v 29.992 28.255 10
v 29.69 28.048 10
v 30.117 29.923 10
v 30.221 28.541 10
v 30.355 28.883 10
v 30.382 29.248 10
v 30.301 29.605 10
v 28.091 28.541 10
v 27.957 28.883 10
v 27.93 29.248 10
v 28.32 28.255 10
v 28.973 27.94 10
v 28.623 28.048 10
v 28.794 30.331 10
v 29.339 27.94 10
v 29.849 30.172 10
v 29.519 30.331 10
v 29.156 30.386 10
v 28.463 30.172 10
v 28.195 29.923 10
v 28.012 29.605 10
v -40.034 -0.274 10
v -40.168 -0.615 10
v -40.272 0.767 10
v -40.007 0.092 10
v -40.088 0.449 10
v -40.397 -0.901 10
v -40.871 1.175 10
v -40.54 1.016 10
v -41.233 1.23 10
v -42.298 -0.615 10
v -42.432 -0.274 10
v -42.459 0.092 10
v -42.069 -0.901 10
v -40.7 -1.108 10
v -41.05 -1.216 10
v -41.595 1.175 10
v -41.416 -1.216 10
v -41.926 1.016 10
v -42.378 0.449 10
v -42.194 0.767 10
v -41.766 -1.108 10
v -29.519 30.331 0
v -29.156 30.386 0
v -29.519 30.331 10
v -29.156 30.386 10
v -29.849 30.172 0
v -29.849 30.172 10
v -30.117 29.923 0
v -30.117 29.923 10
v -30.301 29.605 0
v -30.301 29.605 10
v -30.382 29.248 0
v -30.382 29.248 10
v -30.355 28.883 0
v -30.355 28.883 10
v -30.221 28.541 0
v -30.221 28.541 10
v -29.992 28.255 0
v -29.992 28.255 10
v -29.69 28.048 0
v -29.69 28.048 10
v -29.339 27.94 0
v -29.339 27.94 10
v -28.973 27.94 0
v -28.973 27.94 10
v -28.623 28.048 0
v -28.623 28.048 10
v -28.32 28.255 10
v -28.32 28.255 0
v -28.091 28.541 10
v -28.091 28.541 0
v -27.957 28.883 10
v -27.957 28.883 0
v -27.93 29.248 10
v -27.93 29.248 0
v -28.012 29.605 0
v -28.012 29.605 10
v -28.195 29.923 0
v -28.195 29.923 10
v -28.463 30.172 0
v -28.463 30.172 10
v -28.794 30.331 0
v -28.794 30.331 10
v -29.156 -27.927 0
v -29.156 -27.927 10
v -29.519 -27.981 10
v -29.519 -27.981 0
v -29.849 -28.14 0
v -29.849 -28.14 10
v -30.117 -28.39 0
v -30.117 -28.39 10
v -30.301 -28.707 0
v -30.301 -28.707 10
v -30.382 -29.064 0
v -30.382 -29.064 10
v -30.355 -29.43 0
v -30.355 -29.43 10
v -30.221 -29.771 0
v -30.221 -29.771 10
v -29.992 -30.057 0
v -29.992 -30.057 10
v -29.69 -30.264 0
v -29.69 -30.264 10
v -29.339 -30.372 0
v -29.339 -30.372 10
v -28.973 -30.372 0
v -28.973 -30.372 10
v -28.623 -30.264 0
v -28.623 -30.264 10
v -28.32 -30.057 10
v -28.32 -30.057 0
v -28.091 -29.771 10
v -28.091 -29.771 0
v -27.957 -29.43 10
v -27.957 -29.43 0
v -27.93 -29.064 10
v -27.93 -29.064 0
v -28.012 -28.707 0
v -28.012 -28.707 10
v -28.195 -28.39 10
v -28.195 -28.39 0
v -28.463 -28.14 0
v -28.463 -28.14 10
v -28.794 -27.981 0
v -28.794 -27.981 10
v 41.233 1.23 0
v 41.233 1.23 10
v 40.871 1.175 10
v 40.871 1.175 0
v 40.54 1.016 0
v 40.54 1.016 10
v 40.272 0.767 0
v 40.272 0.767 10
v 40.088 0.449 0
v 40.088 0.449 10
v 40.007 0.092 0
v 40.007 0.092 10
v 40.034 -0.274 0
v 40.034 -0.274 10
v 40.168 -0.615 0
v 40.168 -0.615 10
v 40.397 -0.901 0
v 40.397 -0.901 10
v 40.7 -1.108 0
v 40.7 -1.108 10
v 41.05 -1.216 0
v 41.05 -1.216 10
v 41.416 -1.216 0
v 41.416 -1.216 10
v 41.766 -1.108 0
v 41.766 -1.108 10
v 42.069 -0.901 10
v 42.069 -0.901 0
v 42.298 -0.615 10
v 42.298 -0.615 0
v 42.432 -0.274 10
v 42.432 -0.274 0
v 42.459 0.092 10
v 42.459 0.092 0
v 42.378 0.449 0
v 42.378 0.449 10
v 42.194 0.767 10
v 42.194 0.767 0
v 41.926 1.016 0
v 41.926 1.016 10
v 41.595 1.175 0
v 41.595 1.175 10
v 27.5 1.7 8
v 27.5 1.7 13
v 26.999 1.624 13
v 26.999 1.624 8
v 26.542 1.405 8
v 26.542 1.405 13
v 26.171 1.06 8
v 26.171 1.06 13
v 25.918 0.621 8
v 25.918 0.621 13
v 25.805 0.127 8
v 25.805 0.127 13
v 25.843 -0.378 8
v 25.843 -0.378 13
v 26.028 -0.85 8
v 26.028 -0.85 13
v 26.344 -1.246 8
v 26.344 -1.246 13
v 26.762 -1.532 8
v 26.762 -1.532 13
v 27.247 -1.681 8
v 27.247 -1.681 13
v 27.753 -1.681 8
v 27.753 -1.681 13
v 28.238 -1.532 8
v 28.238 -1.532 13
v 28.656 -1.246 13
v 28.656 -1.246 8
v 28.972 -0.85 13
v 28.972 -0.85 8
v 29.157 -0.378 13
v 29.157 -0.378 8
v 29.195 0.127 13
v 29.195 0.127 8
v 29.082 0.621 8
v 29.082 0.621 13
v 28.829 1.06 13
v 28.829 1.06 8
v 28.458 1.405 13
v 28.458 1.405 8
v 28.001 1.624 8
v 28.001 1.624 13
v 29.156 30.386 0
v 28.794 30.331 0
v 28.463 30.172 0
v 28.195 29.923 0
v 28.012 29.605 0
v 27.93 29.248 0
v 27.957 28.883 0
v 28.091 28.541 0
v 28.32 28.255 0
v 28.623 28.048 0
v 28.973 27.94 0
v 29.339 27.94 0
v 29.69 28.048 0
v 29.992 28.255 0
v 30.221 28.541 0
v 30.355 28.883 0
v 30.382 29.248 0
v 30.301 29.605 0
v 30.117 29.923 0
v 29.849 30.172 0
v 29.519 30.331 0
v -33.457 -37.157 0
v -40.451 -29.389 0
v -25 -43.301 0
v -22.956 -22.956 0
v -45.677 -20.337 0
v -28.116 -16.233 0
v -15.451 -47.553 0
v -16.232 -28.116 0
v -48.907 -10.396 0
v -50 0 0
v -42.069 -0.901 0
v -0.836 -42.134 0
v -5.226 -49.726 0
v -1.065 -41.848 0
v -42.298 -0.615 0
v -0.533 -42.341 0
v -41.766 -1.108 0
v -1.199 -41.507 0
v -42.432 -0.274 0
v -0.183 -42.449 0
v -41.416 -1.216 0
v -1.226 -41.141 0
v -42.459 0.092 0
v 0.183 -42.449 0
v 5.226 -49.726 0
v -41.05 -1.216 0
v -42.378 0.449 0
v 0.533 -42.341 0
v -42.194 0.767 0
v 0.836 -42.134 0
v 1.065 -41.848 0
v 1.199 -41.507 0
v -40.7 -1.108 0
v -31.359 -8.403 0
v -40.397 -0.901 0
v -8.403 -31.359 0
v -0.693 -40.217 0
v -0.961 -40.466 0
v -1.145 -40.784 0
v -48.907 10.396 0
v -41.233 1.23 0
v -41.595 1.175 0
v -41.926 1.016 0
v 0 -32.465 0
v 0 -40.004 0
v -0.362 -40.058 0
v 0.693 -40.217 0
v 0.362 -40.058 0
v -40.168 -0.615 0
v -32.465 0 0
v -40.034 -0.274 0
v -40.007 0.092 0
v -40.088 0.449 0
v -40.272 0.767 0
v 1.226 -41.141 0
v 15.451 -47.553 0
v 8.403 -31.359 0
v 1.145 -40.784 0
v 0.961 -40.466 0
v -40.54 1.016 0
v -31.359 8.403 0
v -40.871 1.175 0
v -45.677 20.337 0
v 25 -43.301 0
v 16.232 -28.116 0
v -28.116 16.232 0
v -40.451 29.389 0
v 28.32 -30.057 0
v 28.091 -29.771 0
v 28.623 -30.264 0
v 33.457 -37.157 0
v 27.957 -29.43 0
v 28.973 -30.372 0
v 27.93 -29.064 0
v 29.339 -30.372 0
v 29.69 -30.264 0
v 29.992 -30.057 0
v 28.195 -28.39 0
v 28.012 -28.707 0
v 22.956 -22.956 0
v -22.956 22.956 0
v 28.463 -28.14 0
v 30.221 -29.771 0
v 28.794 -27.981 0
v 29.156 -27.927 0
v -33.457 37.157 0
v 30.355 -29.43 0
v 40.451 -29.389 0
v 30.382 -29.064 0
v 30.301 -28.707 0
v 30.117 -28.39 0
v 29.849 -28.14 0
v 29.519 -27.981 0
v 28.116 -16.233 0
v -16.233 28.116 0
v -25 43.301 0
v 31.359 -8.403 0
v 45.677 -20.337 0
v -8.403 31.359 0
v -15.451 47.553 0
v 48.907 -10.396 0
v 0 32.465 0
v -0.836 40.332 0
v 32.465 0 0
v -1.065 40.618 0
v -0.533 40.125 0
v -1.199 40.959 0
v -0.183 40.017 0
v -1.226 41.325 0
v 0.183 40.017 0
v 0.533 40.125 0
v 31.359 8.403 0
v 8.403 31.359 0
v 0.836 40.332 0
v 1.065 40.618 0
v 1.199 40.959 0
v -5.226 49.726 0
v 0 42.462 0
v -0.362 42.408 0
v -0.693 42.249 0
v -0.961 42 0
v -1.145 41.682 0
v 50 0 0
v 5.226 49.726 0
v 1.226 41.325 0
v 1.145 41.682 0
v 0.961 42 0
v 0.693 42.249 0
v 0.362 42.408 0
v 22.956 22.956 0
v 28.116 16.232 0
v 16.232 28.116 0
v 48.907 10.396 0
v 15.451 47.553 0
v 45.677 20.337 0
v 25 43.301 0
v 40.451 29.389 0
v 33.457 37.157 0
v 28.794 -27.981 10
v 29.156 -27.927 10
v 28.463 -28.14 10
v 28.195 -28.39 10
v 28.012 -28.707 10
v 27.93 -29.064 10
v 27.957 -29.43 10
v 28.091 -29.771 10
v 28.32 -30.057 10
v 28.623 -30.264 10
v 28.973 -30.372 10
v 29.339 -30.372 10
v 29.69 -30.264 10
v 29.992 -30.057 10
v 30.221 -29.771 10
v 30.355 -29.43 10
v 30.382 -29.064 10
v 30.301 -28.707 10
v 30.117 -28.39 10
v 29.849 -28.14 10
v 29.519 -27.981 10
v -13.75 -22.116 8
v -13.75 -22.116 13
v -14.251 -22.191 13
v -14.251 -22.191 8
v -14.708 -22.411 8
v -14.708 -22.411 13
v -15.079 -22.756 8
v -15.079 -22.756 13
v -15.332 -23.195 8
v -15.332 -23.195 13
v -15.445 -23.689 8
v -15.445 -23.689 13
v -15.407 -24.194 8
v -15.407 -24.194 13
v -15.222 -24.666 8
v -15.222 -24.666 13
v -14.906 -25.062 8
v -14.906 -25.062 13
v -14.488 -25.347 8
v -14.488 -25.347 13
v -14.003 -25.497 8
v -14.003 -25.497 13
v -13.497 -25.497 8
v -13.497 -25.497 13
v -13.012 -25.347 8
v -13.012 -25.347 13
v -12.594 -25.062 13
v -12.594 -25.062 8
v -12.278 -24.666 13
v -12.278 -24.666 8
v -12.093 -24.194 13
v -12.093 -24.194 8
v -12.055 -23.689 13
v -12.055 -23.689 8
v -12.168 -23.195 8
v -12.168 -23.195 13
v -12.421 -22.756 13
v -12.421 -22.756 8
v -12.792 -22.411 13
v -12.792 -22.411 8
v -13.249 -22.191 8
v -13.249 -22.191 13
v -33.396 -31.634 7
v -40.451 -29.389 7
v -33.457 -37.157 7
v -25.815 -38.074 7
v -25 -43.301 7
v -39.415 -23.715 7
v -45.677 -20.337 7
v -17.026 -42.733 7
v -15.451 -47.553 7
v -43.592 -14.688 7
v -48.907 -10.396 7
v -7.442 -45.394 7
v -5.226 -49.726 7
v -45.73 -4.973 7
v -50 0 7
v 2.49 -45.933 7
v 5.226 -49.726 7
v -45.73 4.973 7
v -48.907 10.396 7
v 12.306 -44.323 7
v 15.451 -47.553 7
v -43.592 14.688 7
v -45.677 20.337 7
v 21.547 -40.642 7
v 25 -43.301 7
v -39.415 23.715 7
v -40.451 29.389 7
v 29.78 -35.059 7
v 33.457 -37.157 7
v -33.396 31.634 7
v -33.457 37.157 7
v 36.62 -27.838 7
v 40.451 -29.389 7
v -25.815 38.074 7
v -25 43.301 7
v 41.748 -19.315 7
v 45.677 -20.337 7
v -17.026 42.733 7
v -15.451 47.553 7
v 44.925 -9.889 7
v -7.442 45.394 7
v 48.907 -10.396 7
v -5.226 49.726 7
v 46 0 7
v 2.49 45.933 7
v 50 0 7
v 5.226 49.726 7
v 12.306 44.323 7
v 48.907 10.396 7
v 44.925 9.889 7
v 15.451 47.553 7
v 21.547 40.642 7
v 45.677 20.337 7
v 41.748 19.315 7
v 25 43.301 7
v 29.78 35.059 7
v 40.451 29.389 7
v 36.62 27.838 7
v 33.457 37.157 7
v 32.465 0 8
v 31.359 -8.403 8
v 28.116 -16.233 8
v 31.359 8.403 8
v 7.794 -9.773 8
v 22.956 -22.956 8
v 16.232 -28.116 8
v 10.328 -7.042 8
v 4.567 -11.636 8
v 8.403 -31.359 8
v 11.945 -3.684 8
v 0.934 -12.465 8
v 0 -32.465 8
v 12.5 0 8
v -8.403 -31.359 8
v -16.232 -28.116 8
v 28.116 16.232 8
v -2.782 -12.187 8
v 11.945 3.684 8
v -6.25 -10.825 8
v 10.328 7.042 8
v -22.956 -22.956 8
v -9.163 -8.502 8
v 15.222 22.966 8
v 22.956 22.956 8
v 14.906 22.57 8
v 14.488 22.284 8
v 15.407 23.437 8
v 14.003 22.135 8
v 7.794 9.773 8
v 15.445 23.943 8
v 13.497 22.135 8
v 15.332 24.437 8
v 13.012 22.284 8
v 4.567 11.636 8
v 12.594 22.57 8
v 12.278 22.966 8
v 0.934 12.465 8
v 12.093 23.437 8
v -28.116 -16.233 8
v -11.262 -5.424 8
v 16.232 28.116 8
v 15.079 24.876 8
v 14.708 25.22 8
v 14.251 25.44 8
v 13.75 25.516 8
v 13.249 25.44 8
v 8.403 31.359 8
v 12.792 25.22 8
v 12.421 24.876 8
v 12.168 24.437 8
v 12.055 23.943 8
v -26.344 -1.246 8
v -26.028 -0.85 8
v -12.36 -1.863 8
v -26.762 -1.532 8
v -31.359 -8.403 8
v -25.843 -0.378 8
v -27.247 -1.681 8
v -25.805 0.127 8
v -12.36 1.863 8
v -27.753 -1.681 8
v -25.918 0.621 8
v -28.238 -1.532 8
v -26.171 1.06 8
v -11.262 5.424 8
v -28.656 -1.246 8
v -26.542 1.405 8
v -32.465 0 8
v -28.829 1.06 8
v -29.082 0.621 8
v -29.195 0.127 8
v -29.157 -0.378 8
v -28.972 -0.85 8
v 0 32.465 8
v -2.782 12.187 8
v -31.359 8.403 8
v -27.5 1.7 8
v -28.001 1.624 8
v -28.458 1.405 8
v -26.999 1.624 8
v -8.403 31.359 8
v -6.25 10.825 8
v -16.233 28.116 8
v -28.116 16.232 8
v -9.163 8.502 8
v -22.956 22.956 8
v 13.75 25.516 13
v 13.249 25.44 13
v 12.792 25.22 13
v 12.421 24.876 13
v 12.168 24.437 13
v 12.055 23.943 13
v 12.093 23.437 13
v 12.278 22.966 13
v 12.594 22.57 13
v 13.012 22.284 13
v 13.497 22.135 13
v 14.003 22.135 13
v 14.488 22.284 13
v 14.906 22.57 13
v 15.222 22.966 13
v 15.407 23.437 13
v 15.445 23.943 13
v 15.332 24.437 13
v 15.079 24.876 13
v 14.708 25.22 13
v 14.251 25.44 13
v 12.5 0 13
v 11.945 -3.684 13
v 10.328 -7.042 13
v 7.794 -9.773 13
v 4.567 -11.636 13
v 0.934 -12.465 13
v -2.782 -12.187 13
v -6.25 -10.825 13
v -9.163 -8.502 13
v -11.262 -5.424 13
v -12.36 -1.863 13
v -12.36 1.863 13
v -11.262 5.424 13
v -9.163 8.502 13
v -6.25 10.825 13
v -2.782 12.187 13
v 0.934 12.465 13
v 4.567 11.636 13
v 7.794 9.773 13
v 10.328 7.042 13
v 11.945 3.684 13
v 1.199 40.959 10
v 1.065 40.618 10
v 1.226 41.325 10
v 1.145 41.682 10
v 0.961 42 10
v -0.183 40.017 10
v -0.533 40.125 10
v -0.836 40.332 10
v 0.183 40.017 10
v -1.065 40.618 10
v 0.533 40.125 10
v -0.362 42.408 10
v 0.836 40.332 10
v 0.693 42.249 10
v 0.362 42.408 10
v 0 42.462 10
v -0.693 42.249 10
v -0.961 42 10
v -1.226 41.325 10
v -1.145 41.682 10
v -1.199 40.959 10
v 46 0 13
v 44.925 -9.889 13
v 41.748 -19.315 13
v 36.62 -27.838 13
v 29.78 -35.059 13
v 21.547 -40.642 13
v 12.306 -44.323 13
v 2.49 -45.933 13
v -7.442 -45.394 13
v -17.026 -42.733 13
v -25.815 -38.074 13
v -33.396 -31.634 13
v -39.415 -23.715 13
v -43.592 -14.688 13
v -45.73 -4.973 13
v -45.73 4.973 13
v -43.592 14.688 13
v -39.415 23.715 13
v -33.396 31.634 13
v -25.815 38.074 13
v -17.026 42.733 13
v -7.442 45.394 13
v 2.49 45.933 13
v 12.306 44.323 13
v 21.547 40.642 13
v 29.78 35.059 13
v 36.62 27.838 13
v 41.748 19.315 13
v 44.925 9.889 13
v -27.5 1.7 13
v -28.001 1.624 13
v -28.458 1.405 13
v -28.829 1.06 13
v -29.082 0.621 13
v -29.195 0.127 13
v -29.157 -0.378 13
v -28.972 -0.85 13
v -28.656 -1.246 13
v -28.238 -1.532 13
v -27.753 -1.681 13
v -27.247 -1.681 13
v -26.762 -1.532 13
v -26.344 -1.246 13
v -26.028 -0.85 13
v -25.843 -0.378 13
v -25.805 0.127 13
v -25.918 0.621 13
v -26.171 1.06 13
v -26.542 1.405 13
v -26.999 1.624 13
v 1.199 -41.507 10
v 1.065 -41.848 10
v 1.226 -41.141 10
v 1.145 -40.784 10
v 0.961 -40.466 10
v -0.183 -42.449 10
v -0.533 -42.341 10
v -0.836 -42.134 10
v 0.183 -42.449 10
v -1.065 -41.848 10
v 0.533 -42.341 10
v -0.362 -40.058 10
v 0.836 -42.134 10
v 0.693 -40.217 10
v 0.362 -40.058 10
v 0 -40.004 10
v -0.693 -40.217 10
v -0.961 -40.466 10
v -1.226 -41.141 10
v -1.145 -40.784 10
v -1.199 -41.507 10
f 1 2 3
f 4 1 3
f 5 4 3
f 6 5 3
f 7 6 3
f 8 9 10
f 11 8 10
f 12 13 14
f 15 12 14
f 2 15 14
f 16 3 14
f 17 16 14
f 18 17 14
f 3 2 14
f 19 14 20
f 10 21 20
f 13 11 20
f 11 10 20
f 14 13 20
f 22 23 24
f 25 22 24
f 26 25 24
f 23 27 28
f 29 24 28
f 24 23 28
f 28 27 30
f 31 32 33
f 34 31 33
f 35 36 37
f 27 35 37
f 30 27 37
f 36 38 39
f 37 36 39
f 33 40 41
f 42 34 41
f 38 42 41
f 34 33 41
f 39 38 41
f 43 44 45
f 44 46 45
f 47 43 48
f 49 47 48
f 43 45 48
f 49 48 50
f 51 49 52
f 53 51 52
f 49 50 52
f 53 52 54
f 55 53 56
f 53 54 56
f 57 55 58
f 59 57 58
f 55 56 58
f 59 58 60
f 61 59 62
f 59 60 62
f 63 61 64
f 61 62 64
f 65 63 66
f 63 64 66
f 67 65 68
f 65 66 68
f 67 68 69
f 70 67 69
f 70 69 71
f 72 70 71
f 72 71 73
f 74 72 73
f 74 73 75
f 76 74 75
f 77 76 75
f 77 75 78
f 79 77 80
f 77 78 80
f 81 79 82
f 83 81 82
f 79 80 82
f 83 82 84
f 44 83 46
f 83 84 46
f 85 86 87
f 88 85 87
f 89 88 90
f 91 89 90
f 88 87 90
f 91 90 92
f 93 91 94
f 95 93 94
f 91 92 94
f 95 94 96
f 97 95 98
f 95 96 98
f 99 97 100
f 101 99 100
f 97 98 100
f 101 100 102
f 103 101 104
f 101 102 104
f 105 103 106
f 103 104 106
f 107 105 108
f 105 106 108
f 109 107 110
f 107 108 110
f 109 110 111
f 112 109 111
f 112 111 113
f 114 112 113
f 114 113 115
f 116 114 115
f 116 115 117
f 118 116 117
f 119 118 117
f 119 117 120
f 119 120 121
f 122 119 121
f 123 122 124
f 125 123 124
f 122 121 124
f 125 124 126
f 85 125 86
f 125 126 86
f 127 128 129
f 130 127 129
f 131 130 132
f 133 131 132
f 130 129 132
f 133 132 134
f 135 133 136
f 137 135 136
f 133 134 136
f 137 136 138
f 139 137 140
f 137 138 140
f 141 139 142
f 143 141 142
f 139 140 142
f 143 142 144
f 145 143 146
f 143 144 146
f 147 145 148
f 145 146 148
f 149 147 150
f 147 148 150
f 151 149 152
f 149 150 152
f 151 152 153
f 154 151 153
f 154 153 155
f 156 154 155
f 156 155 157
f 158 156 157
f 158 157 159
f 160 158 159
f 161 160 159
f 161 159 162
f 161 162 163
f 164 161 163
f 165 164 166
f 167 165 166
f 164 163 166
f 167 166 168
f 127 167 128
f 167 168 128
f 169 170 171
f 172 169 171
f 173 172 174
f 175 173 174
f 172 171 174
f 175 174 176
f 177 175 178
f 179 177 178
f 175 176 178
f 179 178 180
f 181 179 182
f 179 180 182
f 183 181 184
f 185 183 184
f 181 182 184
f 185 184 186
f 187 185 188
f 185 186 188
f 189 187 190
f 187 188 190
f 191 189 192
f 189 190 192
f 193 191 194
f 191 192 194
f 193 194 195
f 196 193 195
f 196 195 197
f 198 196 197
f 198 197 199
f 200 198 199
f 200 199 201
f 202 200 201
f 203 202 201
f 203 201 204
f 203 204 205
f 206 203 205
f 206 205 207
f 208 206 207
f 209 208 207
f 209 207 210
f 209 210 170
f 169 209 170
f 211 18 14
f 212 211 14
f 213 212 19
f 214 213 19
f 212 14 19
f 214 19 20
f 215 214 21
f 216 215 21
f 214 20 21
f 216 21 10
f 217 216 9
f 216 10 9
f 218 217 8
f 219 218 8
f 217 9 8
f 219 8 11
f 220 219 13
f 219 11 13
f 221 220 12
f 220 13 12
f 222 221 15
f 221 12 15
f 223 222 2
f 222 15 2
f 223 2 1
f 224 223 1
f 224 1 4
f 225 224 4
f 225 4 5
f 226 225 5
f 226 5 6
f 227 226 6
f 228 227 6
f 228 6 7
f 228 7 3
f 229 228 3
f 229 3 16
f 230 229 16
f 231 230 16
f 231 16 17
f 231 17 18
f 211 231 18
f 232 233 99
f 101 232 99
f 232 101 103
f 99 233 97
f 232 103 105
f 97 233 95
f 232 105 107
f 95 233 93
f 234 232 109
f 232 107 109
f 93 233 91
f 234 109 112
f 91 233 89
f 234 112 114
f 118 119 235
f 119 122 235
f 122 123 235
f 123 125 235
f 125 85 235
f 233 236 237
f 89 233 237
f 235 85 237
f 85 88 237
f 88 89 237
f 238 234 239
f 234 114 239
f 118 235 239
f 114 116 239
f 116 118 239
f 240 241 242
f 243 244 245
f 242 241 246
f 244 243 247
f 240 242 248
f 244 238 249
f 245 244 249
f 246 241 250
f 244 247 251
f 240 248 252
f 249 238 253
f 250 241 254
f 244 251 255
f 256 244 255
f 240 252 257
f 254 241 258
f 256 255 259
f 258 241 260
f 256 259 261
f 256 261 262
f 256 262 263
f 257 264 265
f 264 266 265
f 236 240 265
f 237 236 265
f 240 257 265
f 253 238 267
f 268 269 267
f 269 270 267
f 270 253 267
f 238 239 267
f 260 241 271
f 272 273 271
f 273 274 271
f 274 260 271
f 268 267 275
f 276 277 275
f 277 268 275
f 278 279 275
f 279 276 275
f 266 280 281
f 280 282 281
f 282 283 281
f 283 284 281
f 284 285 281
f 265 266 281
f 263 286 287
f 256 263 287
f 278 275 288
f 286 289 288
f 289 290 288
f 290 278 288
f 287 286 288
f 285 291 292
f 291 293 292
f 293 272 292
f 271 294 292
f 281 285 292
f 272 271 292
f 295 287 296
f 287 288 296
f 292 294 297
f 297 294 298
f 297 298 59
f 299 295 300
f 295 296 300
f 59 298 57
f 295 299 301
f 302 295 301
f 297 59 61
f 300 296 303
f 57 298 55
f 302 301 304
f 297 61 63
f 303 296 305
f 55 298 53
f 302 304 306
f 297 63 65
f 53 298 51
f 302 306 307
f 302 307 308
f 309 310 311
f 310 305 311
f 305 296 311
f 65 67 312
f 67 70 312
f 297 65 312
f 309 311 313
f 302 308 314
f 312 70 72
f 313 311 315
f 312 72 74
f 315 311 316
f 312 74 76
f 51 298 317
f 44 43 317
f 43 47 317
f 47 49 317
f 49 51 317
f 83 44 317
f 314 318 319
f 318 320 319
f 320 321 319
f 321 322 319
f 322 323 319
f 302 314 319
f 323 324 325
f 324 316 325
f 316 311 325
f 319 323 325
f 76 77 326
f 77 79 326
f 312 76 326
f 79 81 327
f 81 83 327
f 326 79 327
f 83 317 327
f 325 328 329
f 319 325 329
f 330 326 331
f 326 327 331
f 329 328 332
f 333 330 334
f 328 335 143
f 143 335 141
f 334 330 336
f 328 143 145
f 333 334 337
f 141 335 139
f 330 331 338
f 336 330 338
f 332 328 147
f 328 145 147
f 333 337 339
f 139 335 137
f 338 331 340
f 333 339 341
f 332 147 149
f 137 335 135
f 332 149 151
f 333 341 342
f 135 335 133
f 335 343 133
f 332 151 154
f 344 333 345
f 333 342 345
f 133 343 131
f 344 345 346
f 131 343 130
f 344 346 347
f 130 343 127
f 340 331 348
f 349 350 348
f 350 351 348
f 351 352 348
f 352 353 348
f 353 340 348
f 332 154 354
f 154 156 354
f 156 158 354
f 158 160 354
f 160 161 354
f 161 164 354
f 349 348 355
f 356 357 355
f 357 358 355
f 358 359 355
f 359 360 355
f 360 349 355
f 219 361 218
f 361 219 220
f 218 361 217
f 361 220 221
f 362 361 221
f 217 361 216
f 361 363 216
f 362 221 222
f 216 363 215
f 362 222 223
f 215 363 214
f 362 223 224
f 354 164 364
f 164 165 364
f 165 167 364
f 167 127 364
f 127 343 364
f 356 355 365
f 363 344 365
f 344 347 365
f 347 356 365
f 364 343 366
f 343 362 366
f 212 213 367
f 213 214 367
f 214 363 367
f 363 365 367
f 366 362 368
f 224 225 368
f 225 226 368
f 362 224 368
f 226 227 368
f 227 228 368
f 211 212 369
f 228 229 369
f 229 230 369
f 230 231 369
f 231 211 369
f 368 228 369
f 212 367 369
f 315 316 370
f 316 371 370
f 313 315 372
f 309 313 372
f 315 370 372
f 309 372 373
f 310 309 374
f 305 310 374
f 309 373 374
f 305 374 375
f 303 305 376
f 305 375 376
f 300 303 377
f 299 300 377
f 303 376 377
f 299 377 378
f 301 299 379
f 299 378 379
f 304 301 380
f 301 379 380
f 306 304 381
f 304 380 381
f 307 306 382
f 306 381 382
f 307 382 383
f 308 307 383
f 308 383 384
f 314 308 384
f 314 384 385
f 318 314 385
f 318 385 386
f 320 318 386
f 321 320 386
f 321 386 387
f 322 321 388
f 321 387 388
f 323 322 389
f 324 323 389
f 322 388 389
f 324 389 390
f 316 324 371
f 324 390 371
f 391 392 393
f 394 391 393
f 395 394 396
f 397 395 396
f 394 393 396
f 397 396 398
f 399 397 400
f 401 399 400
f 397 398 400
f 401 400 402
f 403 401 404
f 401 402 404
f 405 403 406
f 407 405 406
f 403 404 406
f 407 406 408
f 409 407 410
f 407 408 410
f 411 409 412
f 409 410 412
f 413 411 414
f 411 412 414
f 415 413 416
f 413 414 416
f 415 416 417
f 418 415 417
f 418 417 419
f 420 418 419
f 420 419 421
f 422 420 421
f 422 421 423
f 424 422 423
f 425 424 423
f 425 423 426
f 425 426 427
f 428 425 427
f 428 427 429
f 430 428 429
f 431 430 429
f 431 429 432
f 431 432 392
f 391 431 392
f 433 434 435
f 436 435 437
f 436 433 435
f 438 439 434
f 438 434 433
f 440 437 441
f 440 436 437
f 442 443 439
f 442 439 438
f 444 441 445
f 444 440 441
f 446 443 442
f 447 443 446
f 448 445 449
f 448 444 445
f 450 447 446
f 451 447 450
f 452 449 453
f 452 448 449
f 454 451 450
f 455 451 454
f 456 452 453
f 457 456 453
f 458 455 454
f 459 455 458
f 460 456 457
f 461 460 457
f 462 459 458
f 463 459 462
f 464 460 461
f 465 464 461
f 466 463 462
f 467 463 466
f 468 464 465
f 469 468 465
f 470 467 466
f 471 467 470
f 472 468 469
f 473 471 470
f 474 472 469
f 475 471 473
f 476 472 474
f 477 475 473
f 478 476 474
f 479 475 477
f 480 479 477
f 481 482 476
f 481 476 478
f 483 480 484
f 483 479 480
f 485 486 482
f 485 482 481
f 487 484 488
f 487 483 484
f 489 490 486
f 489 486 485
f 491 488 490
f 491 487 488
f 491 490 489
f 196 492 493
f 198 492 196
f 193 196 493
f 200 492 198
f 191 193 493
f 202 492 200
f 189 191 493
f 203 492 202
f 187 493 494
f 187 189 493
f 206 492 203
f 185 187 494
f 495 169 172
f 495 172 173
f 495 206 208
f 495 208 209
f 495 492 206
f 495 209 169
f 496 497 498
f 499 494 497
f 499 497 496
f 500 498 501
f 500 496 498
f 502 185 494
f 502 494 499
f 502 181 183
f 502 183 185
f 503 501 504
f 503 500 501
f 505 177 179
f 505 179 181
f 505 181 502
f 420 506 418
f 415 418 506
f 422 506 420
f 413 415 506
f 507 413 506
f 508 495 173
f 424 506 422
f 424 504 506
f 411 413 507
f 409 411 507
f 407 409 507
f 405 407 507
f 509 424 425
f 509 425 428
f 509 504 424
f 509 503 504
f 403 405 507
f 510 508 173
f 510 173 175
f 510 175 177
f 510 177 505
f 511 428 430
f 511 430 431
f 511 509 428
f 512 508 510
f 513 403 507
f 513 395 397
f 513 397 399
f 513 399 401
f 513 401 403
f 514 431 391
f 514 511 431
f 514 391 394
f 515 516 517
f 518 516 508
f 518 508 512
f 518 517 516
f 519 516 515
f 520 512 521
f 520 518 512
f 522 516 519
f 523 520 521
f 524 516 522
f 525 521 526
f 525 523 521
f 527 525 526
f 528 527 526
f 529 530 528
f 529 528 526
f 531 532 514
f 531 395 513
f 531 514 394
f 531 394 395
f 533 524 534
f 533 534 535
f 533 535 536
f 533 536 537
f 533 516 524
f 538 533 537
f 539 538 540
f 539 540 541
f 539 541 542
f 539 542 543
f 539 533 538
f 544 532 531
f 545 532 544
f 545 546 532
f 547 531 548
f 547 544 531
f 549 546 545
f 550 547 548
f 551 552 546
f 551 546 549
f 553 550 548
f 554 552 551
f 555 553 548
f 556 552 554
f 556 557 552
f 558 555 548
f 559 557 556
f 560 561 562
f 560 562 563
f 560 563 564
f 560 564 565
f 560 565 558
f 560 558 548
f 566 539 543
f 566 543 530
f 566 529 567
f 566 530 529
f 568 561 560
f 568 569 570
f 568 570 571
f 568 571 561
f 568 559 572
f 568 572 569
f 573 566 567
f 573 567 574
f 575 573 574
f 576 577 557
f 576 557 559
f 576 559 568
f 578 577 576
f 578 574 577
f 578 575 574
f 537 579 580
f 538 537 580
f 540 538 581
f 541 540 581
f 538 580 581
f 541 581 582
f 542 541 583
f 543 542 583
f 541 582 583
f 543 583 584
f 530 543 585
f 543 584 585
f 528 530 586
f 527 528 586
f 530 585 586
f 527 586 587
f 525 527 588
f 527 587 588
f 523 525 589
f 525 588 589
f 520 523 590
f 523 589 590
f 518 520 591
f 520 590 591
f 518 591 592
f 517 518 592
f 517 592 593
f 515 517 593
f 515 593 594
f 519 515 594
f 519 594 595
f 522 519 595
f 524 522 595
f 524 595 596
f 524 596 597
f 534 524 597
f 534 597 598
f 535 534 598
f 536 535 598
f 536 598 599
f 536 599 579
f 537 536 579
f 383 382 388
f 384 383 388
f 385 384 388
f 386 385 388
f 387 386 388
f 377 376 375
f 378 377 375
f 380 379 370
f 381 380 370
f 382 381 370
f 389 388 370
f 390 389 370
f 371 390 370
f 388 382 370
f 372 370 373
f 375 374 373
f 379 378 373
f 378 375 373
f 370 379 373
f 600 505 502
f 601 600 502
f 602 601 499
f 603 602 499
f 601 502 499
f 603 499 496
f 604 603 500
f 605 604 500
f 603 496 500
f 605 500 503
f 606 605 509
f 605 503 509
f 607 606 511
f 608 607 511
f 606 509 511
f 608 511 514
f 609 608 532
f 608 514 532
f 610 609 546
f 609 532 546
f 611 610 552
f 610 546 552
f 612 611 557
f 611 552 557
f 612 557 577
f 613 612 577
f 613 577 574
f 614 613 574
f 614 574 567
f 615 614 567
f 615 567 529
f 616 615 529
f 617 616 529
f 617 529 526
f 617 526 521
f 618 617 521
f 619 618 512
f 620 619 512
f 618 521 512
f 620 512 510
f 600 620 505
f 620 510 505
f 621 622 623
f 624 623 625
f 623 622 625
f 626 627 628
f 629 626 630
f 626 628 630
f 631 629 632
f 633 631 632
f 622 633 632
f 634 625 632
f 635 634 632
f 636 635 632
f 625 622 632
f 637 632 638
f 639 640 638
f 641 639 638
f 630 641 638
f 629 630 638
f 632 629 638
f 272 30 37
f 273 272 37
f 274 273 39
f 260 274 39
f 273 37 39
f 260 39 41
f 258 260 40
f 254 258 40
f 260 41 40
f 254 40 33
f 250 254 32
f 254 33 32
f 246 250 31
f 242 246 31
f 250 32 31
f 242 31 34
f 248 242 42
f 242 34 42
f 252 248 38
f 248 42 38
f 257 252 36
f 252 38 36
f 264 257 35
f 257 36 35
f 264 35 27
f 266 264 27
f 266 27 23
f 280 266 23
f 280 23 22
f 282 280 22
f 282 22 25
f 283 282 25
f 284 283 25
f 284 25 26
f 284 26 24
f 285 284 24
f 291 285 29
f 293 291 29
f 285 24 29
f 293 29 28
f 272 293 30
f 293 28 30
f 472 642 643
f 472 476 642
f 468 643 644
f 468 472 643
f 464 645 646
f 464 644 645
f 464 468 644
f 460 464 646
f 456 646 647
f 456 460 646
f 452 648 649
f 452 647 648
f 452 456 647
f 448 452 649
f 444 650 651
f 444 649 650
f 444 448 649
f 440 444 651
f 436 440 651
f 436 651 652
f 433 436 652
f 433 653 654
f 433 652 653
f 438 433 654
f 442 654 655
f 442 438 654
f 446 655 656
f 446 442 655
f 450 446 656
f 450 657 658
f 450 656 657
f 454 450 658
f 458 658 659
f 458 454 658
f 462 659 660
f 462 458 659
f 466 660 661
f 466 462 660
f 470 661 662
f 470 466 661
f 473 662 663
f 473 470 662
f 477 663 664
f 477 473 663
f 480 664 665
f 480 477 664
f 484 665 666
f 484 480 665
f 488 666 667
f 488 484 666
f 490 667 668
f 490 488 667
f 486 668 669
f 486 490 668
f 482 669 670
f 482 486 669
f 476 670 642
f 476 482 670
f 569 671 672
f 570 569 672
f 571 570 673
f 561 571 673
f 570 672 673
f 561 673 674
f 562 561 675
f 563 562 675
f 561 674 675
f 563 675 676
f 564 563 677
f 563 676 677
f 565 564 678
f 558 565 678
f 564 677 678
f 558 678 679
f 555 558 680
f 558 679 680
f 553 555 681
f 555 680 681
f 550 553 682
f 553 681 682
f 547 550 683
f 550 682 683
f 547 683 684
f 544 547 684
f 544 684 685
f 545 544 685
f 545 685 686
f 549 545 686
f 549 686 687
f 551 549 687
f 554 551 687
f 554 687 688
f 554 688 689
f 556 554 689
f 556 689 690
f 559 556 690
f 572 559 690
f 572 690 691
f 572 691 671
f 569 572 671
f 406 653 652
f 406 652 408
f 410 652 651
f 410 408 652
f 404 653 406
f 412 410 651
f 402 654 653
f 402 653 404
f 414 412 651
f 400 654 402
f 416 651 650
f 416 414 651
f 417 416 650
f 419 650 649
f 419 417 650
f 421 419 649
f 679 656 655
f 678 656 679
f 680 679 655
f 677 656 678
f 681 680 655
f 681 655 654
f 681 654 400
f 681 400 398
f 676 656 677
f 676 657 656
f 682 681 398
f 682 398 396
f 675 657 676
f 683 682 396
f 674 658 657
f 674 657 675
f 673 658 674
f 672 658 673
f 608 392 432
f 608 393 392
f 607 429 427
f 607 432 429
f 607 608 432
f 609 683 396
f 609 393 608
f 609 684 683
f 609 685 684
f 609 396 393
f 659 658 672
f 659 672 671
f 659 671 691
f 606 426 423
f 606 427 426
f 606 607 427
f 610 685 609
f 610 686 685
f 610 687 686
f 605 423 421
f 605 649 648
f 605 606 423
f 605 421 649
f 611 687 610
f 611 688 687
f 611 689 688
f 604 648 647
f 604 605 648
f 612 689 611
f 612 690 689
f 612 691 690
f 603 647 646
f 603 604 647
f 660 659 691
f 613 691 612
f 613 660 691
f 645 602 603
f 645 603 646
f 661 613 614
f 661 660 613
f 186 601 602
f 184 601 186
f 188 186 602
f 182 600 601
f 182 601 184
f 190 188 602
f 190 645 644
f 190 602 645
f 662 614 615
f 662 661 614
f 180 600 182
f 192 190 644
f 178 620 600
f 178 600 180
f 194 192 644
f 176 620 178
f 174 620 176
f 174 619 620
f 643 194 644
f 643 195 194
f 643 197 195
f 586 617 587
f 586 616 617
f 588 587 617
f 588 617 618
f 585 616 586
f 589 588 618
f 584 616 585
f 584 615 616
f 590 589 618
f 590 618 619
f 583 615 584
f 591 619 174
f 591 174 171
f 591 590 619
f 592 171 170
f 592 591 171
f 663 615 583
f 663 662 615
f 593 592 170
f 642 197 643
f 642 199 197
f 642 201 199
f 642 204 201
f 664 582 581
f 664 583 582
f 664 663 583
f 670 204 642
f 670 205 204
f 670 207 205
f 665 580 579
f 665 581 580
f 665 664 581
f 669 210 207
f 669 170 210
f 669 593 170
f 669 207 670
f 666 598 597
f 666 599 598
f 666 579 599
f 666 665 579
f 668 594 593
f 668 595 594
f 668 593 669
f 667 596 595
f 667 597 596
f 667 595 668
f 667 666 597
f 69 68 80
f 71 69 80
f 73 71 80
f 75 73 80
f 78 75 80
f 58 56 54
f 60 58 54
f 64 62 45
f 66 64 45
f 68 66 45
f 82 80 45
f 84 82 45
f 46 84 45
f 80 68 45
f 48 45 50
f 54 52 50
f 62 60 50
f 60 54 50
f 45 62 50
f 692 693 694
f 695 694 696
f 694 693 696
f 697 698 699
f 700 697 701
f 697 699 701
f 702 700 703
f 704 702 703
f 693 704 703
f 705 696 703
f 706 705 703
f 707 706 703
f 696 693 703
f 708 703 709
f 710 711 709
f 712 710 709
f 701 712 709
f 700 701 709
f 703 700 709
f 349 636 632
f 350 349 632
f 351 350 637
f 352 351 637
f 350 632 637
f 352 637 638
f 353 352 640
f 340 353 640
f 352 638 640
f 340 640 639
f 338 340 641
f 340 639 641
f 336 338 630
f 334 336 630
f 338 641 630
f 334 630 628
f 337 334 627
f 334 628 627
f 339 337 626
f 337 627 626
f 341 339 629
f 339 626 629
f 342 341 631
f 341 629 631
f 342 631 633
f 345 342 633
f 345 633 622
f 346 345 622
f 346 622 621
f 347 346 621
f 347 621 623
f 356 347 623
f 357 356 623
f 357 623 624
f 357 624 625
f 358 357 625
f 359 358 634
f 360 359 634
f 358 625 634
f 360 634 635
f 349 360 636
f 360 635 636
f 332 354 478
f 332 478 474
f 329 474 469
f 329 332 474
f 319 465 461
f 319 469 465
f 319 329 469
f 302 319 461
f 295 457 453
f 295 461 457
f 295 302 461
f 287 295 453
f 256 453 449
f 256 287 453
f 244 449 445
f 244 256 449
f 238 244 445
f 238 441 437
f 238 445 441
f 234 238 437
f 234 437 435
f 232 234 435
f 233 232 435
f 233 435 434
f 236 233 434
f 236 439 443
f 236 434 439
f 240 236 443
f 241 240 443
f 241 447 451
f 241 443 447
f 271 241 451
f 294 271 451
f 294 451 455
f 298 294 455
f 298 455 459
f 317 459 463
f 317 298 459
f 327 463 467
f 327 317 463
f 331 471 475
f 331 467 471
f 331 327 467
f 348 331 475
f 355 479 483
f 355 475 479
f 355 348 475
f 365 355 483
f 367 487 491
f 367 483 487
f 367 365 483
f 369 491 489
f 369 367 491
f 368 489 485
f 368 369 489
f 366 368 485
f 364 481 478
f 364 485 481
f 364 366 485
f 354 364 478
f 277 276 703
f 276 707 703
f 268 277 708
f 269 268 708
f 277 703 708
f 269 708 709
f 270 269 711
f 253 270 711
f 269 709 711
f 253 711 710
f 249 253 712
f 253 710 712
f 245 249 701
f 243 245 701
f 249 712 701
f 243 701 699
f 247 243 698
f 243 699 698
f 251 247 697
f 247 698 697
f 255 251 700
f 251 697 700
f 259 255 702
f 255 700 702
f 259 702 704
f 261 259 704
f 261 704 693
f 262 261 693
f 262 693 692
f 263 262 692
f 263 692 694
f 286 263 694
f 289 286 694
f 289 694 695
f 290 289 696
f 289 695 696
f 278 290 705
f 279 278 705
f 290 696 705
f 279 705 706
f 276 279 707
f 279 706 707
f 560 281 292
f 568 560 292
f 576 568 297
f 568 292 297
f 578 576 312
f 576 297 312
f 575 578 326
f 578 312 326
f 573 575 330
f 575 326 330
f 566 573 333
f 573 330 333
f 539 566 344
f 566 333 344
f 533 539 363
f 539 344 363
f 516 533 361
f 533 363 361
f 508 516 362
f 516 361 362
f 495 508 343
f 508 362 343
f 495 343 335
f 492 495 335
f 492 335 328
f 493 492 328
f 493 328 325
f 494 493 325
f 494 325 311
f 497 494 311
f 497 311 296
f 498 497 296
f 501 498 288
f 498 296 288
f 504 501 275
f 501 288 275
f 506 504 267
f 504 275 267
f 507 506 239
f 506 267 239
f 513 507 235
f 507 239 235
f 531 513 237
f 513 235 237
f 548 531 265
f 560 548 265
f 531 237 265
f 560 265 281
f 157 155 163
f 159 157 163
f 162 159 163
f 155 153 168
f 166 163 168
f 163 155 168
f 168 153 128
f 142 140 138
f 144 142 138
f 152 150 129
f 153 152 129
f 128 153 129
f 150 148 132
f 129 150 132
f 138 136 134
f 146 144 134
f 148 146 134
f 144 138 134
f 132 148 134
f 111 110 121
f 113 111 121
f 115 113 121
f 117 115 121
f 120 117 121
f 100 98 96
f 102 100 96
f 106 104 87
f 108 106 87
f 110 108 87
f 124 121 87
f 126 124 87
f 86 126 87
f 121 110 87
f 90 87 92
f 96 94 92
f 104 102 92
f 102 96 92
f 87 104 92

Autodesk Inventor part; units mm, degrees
ref_plane "YZ Plane" through (0, 0, 0) normal (1, 0, 0) x (0, 1, 0)
sketch "Sketch1" plane through (0, 0, 0) normal (0, 0, 1) x (1, 0, 0)
  circle A0 centre (0, 0) radius 50
  circle A1 centre (0, 0) radius 12.5
  circle A2 centre (0, 0) radius 14.5
  line L0 (-15.5, -15.5) -> (15.5, -15.5) construction
  line L1 (15.5, -15.5) -> (15.5, 15.5) construction
  line L2 (15.5, 15.5) -> (-15.5, 15.5) construction
  line L3 (-15.5, 15.5) -> (-15.5, -15.5) construction
  line L4 (-15.5, -15.5) -> (15.5, 15.5) construction
  line L5 (15.5, -15.5) -> (-15.5, 15.5) construction
  dimension "Diametro" = 100
  dimension "d1" = 25
  dimension "d2" = 2
  dimension "d8" = 31
extrude "Extrusion1" add sketch "Sketch1" along normal blind 7 contours A0 | A2
extrude "Extrusion2" add sketch "Sketch1" along normal blind 100 contours A2
ref_plane "Work Plane1" through (0, 0, 22) normal (0, 0, 1) x (1, 0, 0)
sketch "Sketch2" plane through (0, 0, 22) normal (0, 0, 1) x (1, 0, 0)
  arc A0 (2.5, 24.8747) -> (-2.5, 24.8747) centre (0, 0) ccw
  line L0 (2.5, 24.8747) -> (2.5, 14.2829)
  line L1 (-2.5, 24.8747) -> (-2.5, 14.2829)
  line L2 (0, -70) -> (0, 70) projected
  circle A1 centre (0, 0) radius 14.5 projected
  point P0 (0, 25)
  dimension "d24" = 5
  dimension "d25" = 25
  dimension "Dedos" = 5
extrude "Extrusion3" add sketch "Sketch2" along normal blind 15 contours L0 A1 L2 A0 | L2 A1 L1 A0
sketch "Sketch3" plane through (0, 0, 0) normal (1, 0, 0) x (0, 1, 0)
  line L0 (25, 37) -> (24.8747, 37) projected
  line L1 (14.2829, 22) -> (14.5, 22) projected
  line L2 (25, 22) -> (25, 37) projected
  line L3 (14.2829, 22) -> (14.2829, 37) projected
  circle A0 centre (25.74, 29.5) radius 1.5
  line L4 (0, -7.4) -> (0, 44.4) projected
  point P0 (0, 0)
  point P1 (25, 29.5)
  dimension "d31" = 3
  dimension "d92" = 25.74
fillet "Fillet2" radius 8 1 edges at (0, 25, 22)
pattern_circular "Circular Pattern1" count 4 over 360 about axis through (0, 0, 0) along (0, 0, 1) of "Fillet2", "Extrusion3"
ref_plane "Plano de trabajo2" through (0, 0, 54) normal (0, 0, 1) x (1, 0, 0)
sketch "Boceto4" plane through (0, 0, 54) normal (0, 0, 1) x (1, 0, 0)
  circle A0 centre (0, 0) radius 17.5
  circle A1 centre (0, 0) radius 14.5 projected
  line L0 (4, -23.75) -> (4, -26.75) projected
  dimension "d54" = 35
extrude "Extrusión5" add sketch "Boceto4" against normal up to surface (47 mm away)
sketch "Boceto5" plane through (0, 0, 37) normal (0, 0, 1) x (0, 1, 0)
  arc A0 (-2.5, -17.3205) -> (2.5, -17.3205) centre (0, 0) ccw projected
  line L0 (-2.5, -17.3205) -> (-2.5, -24.8747) projected
  arc A1 (-2.5, -24.8747) -> (2.5, -24.8747) centre (0, 0) ccw projected
  line L1 (2.5, -24.8747) -> (2.5, -17.3205) projected
  circle A2 centre (0, 0) radius 14.5 projected
  line L2 (2.5, -17.3205) -> (2.5, -14.2829)
  line L3 (-2.5, -17.3205) -> (-2.5, -14.2829)
extrude "Extrusión6" add sketch "Boceto5" along normal blind 20 contours L3 A2 L2 A0 | A0 L1 A1 L0
fillet "Empalme4" radius 8 1 edges at (25, 0, 57)
pattern_circular "Patrón circular2" count 4 over 360 about axis through (0, 0, 54) along (0, 0, -1) of "Extrusión6", "Empalme4"
chamfer "Chaflán1" distance 2 angle 45 1 edges at (-14.5, 0, 100)
sketch "Boceto6" plane through (0, 0, 7) normal (0, 0, 1) x (1, 0, 0)
  circle A0 centre (0, 0) radius 50 projected
  arc A1 (17.3205, 2.5) -> (2.5, 17.3205) centre (0, 0) ccw construction
  line L0 (0, 0) -> (32.476, 18.75) construction
  arc A2 (17.3205, 2.5) -> (2.5, 17.3205) centre (0, 0) ccw construction
  point P0 (16.25, -6.4952)
  point P1 (16.25, 6.4952)
  point P2 (0, 37.5)
  point P3 (-32.476, 18.75)
  point P4 (-32.476, -18.75)
  point P5 (0, -37.5)
  point P6 (32.476, -18.75)
  point P7 (10.8253, 13.75)
  point P8 (15.1554, 8.75)
  dimension "d73" = 360
  dimension "d91" = 37.5
sketch "Boceto8" plane through (0, 0, 7) normal (0, 0, 1) x (1, 0, 0)
  circle A0 centre (0, 0) radius 17.5 projected
  circle A1 centre (0, 0) radius 50 projected
  circle A2 centre (0, 0) radius 46
  dimension "Espesor" = 4
extrude "Extrusión8" add sketch "Boceto8" along normal blind 6 contours A2
sketch "Boceto9" plane through (2.5, 14.0104, 54) normal (1, 0, 0) x (0, -1, 0)
  line L0 (16.5104, 0) -> (28.2932, 0) projected
  line L1 (-35.9896, 54) -> (64.0104, 54) projected
  point P0 (1.4018, 24.5)
  point P1 (22.4018, 0)
  dimension "d124" = 21
  dimension "d125" = 29.5
hole "Agujero4" at (2.5, 12.6086, 29.5) direction (-1, 0, 0) diameter 3.4 depth 5 clearance for "Tornillo de cabeza plana avellanada ISO 2009/7046" size "M3" standard "ISO"
pattern_circular "Patrón circular3" count 4 over 360 about axis through (0, 0, 54) along (0, 0, -1) of "Agujero4"
sketch "Boceto13" plane through (0, 0, 13) normal (0, 0, 1) x (1, 0, 0)
  point P0 (0, 0)
sketch "Boceto15" plane through (0, 0, 0) normal (0, 0, -1) x (-1, 0, 0)
  circle A0 centre (0, 0) radius 27.5 construction
  point P0 (27.5, 0)
  point P1 (13.75, 23.8157)
  point P2 (-13.75, 23.8157)
  point P3 (-27.5, 0)
  point P4 (-13.75, -23.8157)
  point P5 (13.75, -23.8157)
  dimension "d134" = 55
  dimension "d137" = 360
hole "Agujero8" at (-13.75, -23.8157, 0) at (13.75, -23.8157, 0) at (27.5, 0, 0) at (13.75, 23.8157, 0) at (-13.75, 23.8157, 0) at (-27.5, 0, 0) direction (0, 0, 1) diameter 3.4 end through all clearance for "Tornillo de cabeza cilíndrica ranurada ISO 1207" size "M3" standard "ISO"
sketch "Boceto16" plane through (0, 0, 0) normal (0, 0, -1) x (-1, 0, 0)
  circle A0 centre (0, 0) radius 32.465
  dimension "d146" = 64.93
extrude "Extrusión10" cut sketch "Boceto16" against normal blind 8
sketch "Boceto18" plane through (0, 0, 0) normal (0, 0, -1) x (-1, 0, 0)
  point P0 (0, 0)
  point P1 (-41.233, 0)
  point P2 (-29.1561, -29.1561)
  point P3 (0, -41.233)
  point P4 (29.1561, -29.1561)
  point P5 (41.233, 0)
  point P6 (29.1561, 29.1561)
  point P7 (0, 41.233)
  point P8 (-29.1561, 29.1561)
  dimension "d162" = 41.233
  dimension "d165" = 360
hole "Agujero10" at (41.233, 0, 0) at (29.1561, -29.1561, 0) at (0, -41.233, 0) at (-29.1561, -29.1561, 0) at (-41.233, 0, 0) at (-29.1561, 29.1561, 0) at (0, 41.233, 0) at (29.1561, 29.1561, 0) direction (0, 0, 1) diameter 2.459 depth 10 thread size "M3x0.5" class "6H" standard "ISO Metric profile"
sketch "Sketch19" plane through (14.2829, -2.5, 54) normal (0, -1, 0) x (1, 0, 0)
  circle A0 centre (6.7167, -24.5) radius 1.7
  line L0 (3.0377, 0) -> (3.0377, -31.9844) projected
  line L1 (3.0377, 0) -> (-11.7829, 0) projected
  point P0 (-14.2829, -54)
  dimension "d174" = 3.4
  dimension "d175" = 3.679
  dimension "d176" = 24.5
hole "Hole11" at (20.9995, -2.5, 29.5) direction (0, 1, 0) diameter 4 depth 5
pattern_circular "Circular Pattern4" count 4 over 360 about axis through (0, 0, 0) along (0, 0, 1) of "Hole11"
sketch "Sketch20" plane through (0, 0, 13) normal (0, 0, 1) x (1, 0, 0)
  circle A0 centre (-27.5, 0) radius 1.7 projected
  circle A1 centre (-13.75, 23.8157) radius 1.7 projected
  circle A2 centre (13.75, 23.8157) radius 1.7 projected
  circle A3 centre (27.5, 0) radius 1.7 projected
  circle A4 centre (13.75, -23.8157) radius 1.7 projected
  circle A5 centre (-13.75, -23.8157) radius 1.7 projected
  circle A6 centre (0, 0) radius 46 projected
  circle A7 centre (0, 0) radius 17.5 projected
  circle A8 centre (0, 0) radius 46
extrude "Extrusion12" cut sketch "Sketch20" along normal up to surface contours A6 | A7
sketch "Sketch21" plane through (0, 0, 13) normal (0, 0, 1) x (1, 0, 0)
  circle A0 centre (0, 0) radius 12.5 projected
  circle A1 centre (-27.5, 0) radius 1.7 projected
  circle A2 centre (-13.75, 23.8157) radius 1.7 projected
  circle A3 centre (13.75, 23.8157) radius 1.7 projected
  circle A4 centre (27.5, 0) radius 1.7 projected
  circle A5 centre (13.75, -23.8157) radius 1.7 projected
  circle A6 centre (-13.75, -23.8157) radius 1.7 projected
  circle A7 centre (0, 0) radius 46 projected
  circle A8 centre (-13.75, 23.8157) radius 1.7
  circle A9 centre (13.75, -23.8157) radius 1.7
extrude "Extrusion13" add sketch "Sketch21" against normal up to surface (5 mm away) contours A2 | A5
equation "\"d24\" = Dedos"
equation "\"d91\" = 0.375 * Diametro"
properties part number "Soporte2" material "Aluminum 7075"
